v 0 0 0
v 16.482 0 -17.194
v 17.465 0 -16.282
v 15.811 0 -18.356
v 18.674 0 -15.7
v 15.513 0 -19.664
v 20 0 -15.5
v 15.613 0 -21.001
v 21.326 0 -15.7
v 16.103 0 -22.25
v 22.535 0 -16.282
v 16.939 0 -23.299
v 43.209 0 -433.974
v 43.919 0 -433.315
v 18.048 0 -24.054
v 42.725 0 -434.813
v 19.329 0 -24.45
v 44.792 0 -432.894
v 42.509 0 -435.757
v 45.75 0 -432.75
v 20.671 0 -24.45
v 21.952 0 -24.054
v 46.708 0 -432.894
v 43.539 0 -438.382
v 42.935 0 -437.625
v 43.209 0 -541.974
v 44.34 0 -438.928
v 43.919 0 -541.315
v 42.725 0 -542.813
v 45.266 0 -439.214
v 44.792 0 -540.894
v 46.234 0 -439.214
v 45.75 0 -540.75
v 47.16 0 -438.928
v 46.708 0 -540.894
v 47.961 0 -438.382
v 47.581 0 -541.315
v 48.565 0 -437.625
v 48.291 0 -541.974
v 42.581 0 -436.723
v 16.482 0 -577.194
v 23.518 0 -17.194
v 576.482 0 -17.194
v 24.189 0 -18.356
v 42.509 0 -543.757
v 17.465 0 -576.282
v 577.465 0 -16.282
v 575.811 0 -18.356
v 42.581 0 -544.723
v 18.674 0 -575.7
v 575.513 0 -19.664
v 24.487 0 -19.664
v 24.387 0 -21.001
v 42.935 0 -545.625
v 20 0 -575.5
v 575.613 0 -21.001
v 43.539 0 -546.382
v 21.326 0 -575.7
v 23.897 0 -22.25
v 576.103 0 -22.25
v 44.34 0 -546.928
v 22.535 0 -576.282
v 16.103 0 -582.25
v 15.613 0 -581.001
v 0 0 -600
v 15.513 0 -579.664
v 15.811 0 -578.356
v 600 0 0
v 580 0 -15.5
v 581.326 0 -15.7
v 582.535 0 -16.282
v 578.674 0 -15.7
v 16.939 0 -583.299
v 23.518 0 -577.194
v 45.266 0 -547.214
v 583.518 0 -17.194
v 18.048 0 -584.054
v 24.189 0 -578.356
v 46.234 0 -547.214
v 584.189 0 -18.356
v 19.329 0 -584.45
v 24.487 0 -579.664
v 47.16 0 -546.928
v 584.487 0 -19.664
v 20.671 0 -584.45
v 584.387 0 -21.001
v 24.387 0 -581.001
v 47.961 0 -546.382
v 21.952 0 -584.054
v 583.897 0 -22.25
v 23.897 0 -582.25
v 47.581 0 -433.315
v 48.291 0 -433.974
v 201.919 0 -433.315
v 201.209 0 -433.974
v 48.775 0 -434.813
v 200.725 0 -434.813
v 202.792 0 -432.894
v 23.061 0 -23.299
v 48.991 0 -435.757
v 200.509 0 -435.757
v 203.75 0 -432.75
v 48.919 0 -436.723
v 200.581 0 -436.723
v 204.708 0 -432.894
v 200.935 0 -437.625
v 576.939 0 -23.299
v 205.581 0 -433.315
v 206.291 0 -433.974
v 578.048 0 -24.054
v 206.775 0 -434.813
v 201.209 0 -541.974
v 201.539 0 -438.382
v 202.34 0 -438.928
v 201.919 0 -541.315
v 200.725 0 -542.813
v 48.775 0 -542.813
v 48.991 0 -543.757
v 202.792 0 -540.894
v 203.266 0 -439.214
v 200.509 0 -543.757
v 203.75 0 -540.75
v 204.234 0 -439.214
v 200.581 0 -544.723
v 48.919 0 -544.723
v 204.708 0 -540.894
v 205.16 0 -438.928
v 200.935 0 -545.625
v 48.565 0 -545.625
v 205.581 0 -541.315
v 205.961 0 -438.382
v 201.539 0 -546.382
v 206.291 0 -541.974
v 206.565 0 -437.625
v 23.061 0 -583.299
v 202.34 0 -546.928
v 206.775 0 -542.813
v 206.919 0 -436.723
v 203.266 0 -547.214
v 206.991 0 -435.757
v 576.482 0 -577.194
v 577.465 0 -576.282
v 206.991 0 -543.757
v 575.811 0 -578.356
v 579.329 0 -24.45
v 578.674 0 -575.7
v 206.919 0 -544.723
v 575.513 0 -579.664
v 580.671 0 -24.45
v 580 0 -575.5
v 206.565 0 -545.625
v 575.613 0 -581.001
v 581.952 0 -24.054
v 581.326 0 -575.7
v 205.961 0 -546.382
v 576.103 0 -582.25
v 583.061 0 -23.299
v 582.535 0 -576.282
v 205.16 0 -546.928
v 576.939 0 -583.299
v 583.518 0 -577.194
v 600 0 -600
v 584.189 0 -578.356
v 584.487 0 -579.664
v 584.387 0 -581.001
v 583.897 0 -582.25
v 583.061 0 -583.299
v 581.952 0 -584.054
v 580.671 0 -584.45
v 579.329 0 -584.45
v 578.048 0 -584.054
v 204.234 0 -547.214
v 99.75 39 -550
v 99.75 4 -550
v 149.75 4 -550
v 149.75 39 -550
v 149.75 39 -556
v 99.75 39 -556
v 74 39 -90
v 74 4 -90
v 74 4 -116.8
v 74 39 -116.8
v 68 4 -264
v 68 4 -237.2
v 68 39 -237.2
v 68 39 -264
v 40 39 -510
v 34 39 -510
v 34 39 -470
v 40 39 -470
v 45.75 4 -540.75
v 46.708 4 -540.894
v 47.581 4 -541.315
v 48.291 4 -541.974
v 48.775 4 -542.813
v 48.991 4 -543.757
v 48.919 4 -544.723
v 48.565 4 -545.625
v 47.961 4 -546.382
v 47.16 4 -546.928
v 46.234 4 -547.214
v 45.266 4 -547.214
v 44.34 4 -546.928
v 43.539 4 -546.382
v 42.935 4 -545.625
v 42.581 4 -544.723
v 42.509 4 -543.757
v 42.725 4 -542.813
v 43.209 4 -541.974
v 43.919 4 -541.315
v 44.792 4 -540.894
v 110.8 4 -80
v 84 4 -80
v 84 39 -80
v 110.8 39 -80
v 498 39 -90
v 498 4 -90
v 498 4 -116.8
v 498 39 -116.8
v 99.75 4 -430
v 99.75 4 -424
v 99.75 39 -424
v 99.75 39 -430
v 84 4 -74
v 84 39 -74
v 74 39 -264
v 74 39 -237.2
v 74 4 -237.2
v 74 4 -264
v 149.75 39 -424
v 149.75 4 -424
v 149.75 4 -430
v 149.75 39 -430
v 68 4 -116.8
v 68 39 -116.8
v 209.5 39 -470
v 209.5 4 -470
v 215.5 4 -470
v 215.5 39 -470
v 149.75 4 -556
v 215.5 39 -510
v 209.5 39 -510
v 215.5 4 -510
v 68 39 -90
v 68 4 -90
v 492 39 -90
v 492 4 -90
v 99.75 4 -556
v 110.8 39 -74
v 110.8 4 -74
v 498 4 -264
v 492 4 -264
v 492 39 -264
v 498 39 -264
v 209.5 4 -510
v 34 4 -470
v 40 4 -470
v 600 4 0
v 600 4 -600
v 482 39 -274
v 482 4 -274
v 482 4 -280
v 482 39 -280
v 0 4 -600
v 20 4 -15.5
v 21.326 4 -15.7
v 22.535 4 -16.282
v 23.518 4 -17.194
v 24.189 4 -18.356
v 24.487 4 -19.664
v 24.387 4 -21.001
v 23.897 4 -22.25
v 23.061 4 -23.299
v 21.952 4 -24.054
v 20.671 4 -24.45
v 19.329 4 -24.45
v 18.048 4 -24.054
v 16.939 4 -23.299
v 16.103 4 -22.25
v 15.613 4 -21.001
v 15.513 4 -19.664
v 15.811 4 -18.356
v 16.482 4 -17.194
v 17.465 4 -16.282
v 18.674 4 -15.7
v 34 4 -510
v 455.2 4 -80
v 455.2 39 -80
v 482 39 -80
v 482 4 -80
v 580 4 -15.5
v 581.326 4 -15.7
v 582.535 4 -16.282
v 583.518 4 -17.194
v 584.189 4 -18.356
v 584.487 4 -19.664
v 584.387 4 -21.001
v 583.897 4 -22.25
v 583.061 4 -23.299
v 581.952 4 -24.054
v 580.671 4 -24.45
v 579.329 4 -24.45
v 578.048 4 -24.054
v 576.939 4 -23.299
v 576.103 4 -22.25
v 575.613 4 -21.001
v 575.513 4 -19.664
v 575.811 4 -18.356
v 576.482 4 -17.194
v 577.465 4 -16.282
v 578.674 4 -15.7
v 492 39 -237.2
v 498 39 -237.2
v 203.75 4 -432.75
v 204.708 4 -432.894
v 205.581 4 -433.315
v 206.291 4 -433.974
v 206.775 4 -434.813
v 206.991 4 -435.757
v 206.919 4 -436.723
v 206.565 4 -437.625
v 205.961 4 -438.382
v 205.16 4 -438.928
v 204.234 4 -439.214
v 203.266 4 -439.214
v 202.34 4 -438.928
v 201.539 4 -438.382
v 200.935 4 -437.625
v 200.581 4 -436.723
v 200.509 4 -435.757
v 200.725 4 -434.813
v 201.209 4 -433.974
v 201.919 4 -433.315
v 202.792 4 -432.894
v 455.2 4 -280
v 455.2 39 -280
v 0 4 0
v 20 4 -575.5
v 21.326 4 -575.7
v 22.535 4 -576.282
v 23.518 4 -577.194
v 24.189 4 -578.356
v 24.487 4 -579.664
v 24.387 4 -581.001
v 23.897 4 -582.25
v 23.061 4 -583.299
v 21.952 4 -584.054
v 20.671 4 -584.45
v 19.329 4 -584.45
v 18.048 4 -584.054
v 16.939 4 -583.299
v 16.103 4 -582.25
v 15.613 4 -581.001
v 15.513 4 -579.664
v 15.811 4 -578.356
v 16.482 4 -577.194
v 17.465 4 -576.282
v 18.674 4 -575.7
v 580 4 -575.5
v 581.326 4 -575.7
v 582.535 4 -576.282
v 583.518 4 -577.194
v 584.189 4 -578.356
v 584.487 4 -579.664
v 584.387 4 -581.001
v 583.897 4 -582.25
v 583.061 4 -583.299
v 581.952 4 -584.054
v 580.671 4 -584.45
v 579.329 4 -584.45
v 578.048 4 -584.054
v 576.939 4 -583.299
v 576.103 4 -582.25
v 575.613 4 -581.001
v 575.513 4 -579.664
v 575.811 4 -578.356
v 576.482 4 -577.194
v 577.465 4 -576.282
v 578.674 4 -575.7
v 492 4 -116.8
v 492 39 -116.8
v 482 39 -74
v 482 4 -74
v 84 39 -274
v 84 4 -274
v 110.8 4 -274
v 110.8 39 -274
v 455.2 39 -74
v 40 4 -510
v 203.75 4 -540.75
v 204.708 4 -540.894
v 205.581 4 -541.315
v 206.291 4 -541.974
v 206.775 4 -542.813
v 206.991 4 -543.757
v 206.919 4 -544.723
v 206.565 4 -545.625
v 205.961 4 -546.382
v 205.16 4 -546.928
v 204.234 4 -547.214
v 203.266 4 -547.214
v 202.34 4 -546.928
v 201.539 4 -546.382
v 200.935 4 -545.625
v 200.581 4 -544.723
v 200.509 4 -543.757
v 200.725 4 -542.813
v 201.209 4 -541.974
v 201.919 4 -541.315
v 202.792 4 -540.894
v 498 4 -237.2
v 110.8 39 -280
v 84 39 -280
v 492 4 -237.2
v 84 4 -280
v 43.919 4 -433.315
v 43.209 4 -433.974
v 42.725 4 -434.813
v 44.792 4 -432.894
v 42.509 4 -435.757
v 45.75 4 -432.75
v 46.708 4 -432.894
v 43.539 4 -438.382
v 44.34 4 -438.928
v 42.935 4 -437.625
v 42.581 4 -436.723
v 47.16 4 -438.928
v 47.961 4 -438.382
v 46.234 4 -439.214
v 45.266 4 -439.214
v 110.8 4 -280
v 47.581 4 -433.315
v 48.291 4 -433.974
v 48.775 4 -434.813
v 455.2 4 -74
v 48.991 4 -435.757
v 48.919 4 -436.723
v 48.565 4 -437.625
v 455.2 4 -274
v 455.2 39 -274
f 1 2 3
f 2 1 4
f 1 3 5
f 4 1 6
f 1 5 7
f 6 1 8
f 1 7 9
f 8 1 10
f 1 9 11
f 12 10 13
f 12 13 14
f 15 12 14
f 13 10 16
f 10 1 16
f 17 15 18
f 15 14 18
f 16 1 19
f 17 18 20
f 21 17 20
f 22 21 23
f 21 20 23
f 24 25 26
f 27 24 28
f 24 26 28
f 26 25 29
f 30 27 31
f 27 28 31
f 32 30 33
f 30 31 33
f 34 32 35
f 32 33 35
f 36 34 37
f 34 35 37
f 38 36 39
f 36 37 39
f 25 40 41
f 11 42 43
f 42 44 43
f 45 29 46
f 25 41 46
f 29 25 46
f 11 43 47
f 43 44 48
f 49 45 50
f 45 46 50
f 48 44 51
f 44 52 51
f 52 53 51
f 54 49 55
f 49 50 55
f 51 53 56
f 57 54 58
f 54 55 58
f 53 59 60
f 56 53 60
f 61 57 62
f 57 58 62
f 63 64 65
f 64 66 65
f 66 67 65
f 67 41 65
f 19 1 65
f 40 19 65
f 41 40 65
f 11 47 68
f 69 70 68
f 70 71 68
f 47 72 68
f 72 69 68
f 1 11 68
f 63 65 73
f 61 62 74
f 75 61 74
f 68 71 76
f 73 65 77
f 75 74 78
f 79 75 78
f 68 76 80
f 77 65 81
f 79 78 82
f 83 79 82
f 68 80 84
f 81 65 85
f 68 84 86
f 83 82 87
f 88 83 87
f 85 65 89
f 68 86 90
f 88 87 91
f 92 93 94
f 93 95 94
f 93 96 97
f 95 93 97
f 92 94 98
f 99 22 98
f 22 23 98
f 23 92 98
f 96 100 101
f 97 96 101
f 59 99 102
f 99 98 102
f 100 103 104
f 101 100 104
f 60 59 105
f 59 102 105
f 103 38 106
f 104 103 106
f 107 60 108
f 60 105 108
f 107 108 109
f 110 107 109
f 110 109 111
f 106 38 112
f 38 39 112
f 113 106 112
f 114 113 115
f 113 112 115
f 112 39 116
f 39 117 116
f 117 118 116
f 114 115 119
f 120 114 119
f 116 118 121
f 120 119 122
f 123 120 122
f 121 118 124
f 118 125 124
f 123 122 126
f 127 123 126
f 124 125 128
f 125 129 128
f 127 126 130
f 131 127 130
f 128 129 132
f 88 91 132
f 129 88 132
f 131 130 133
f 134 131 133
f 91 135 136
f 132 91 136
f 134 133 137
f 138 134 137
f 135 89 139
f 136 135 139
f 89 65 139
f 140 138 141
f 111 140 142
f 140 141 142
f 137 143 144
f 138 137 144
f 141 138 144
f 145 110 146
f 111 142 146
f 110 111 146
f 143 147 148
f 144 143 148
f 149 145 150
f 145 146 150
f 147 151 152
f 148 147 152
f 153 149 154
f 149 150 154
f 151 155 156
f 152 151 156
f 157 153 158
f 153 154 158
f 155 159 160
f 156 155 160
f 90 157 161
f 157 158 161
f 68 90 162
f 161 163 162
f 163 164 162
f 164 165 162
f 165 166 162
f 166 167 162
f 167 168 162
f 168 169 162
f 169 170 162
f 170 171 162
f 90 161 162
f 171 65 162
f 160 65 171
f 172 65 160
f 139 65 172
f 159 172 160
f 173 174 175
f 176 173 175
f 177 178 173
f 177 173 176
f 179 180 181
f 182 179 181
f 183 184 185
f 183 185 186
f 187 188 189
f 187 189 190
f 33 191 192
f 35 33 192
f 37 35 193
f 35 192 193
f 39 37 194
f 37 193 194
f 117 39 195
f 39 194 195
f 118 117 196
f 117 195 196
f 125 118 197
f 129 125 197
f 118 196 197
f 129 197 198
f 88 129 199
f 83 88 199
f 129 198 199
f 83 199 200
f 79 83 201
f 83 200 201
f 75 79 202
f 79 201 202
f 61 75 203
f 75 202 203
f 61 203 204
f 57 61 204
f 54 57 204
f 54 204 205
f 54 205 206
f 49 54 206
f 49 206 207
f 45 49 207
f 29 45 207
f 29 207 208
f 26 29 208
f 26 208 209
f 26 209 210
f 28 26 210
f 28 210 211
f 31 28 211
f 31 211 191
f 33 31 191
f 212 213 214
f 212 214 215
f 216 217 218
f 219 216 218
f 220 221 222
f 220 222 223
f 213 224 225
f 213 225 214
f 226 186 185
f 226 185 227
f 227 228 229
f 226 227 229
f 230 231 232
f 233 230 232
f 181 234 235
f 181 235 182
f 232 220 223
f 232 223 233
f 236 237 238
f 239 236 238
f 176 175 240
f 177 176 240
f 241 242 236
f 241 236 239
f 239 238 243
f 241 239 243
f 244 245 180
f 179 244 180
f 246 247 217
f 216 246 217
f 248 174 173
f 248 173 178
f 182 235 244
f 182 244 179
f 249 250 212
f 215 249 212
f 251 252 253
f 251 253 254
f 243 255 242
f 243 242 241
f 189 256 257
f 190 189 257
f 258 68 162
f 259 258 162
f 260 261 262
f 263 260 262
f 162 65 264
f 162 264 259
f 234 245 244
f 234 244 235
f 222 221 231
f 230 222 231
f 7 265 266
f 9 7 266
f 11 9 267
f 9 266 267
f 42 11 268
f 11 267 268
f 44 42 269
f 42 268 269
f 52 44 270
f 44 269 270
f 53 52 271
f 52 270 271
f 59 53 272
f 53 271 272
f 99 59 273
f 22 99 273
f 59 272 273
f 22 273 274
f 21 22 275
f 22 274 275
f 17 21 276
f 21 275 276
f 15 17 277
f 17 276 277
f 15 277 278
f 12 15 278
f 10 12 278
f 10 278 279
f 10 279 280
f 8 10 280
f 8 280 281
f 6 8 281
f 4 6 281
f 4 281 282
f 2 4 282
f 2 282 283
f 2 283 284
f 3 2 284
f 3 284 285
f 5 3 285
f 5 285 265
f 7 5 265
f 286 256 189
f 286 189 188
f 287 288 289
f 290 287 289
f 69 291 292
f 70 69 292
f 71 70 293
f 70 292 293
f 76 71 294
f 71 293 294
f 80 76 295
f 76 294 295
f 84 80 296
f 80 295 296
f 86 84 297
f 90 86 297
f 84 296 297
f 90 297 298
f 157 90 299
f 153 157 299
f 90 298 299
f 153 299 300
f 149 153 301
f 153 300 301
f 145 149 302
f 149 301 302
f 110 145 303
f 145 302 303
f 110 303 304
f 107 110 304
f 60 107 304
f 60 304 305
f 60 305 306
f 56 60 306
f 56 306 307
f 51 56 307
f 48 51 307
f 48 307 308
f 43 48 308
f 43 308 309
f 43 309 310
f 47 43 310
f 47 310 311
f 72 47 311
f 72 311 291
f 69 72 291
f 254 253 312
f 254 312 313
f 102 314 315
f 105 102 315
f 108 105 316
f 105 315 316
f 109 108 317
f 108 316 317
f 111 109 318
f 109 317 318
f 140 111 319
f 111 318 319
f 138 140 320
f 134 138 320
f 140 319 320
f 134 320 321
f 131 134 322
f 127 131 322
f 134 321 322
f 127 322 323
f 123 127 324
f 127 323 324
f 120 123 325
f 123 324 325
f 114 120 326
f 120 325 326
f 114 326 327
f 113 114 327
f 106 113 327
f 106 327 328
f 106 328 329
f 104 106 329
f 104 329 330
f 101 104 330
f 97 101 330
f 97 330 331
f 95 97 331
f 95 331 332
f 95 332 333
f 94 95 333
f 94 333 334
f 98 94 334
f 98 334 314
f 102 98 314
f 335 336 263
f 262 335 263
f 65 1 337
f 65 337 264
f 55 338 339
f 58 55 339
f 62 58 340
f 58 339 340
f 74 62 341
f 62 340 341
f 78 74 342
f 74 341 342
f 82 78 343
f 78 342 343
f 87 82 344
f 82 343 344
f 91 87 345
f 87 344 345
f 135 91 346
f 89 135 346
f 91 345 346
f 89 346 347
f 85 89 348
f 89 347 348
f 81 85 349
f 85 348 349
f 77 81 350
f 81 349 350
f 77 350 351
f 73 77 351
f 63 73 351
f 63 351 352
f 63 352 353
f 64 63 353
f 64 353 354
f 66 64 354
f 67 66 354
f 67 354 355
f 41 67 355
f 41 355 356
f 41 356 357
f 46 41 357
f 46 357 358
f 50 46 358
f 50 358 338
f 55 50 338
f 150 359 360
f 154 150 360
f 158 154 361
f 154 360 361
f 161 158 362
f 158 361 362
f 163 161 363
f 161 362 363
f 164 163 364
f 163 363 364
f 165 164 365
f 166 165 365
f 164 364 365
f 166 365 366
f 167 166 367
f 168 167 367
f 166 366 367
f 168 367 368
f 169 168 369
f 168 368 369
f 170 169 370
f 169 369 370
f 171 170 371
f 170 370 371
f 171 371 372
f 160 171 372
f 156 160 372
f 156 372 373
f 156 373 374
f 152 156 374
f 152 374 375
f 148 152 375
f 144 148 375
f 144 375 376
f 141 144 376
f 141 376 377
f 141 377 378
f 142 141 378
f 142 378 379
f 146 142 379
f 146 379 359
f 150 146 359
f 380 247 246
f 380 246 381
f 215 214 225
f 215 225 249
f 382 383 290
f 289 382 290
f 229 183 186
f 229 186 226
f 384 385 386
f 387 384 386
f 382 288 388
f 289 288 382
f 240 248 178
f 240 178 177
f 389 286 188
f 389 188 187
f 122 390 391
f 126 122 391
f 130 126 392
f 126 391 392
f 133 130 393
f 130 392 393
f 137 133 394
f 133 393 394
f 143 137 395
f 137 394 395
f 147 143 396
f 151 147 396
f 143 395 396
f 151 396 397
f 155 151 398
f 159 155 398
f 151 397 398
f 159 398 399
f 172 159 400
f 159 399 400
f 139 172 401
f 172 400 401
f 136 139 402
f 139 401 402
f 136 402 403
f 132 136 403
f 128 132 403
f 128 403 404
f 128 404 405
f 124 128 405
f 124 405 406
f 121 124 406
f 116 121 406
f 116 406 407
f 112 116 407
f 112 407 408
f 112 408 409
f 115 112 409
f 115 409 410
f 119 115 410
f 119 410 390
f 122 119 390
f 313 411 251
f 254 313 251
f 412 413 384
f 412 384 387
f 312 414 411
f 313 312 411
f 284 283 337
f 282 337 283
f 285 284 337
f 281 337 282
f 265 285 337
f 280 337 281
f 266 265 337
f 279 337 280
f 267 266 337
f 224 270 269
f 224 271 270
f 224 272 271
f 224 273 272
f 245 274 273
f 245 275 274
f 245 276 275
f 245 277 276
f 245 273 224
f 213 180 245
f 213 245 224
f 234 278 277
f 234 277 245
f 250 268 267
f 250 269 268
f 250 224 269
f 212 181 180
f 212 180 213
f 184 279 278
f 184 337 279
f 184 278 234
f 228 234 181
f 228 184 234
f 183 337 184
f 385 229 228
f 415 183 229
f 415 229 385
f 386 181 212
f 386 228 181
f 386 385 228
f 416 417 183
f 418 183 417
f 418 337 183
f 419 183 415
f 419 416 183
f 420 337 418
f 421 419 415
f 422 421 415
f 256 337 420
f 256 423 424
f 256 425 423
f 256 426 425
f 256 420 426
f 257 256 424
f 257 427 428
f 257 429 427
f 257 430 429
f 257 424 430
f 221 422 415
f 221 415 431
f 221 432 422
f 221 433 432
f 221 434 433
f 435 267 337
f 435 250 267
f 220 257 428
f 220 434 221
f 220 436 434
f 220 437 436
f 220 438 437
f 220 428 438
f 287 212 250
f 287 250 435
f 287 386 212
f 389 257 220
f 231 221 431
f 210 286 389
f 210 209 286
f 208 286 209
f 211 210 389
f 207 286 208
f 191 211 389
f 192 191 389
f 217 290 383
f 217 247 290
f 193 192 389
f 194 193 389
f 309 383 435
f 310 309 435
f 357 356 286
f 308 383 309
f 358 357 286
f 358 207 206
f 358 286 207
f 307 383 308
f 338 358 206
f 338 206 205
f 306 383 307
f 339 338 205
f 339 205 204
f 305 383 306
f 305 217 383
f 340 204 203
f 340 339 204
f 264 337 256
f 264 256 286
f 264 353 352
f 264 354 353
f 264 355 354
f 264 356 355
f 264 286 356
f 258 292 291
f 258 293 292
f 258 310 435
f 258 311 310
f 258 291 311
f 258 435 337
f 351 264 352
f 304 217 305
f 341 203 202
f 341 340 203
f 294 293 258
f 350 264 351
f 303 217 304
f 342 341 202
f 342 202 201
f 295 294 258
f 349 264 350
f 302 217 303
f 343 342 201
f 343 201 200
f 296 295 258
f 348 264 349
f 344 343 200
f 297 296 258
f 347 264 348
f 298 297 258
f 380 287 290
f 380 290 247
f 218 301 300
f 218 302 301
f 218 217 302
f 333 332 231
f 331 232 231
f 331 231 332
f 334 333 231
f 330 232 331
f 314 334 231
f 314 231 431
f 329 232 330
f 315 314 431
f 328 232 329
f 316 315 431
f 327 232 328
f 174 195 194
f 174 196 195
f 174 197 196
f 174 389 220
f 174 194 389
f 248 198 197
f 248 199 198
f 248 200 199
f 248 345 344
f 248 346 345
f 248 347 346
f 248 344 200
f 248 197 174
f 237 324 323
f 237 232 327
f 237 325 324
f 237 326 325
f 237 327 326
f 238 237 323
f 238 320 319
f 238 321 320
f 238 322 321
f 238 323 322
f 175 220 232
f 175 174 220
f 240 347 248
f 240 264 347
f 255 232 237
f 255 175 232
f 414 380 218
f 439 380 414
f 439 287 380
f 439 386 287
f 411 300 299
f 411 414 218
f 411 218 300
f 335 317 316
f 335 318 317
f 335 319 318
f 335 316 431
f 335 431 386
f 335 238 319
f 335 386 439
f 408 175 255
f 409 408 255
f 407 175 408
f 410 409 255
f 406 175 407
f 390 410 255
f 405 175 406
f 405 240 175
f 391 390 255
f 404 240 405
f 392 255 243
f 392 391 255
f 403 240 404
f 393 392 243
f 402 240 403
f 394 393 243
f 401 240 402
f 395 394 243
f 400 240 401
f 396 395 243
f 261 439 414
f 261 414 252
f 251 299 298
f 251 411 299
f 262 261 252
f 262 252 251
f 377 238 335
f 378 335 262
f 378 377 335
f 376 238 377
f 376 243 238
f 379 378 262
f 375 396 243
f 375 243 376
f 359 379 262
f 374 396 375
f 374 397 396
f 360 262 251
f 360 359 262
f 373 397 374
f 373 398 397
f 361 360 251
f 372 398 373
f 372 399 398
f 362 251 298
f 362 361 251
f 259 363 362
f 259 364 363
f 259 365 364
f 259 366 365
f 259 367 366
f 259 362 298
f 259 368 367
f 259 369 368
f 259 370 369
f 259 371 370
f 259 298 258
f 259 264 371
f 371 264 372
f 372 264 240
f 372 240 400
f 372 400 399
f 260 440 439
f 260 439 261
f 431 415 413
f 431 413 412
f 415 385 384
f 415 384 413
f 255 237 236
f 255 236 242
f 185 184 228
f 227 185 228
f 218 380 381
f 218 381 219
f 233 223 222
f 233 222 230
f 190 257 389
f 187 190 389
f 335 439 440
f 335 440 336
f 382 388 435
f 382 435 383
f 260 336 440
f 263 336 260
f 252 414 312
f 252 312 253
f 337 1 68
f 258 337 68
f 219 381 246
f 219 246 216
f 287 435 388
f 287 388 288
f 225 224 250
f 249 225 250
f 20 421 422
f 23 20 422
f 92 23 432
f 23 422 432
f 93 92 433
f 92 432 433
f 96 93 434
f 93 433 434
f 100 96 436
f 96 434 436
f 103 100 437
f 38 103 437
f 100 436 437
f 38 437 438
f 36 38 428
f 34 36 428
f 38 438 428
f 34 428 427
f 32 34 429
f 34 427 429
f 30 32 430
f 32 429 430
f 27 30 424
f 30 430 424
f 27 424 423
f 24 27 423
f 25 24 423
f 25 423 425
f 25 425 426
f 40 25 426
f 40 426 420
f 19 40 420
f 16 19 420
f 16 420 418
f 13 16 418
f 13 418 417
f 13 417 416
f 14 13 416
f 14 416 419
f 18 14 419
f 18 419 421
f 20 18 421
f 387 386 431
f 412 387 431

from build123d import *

# Parameters (mm, degrees)
SKETCH1_W           = 600
SKETCH1_H           = 600
BOSS_EXTRUDE1_DEPTH = 4
CUT_EXTRUDE1_REACH  = 850.538
SKETCH2_R           = 4.5
CUT_EXTRUDE2_REACH  = 850.538
SKETCH4_R           = 3.25
SKETCH4_3_W         = 6
SKETCH4_3_H         = 40
SKETCH4_3_W_2       = 50
SKETCH4_3_H_2       = 6
BOSS_EXTRUDE2_DEPTH = 35
SKETCH5_W           = 6
SKETCH5_H           = 26.8
SKETCH5_W_2         = 26.8
SKETCH5_H_2         = 6
BOSS_EXTRUDE3_DEPTH = 35


with BuildPart() as part:
    # Sketch1 → Boss-Extrude1 (new body)
    with BuildSketch(Plane(origin=(0, 0, 0), x_dir=(1, 0, 0), z_dir=(0, 1, 0))):
        with Locations((300, 300)):
            Rectangle(SKETCH1_W, SKETCH1_H)
    extrude(amount=BOSS_EXTRUDE1_DEPTH)

    # Sketch2 → Cut-Extrude1 (cut, up to next)
    with BuildSketch(Plane(origin=(0, 4, 0), x_dir=(1, 0, 0), z_dir=(0, 1, 0)), mode=Mode.PRIVATE) as cut_extrude1_sk1:
        with Locations((20, 580)):
            Circle(SKETCH2_R)
    cut_extrude1_tool1 = extrude(cut_extrude1_sk1.sketch, amount=-CUT_EXTRUDE1_REACH, mode=Mode.PRIVATE) & part.part
    # Sketch2 → Cut-Extrude1 (cut, up to next)
    with BuildSketch(Plane(origin=(0, 4, 0), x_dir=(1, 0, 0), z_dir=(0, 1, 0)), mode=Mode.PRIVATE) as cut_extrude1_sk2:
        with Locations((580, 580)):
            Circle(SKETCH2_R)
    cut_extrude1_tool2 = extrude(cut_extrude1_sk2.sketch, amount=-CUT_EXTRUDE1_REACH, mode=Mode.PRIVATE) & part.part
    # Sketch2 → Cut-Extrude1 (cut, up to next)
    with BuildSketch(Plane(origin=(0, 4, 0), x_dir=(1, 0, 0), z_dir=(0, 1, 0)), mode=Mode.PRIVATE) as cut_extrude1_sk3:
        with Locations((580, 20)):
            Circle(SKETCH2_R)
    cut_extrude1_tool3 = extrude(cut_extrude1_sk3.sketch, amount=-CUT_EXTRUDE1_REACH, mode=Mode.PRIVATE) & part.part
    # Sketch2 → Cut-Extrude1 (cut, up to next)
    with BuildSketch(Plane(origin=(0, 4, 0), x_dir=(1, 0, 0), z_dir=(0, 1, 0)), mode=Mode.PRIVATE) as cut_extrude1_sk4:
        with Locations((20, 20)):
            Circle(SKETCH2_R)
    cut_extrude1_tool4 = extrude(cut_extrude1_sk4.sketch, amount=-CUT_EXTRUDE1_REACH, mode=Mode.PRIVATE) & part.part
    add(cut_extrude1_tool1.solids().sort_by_distance((20, 4, -580))[0], mode=Mode.SUBTRACT)
    add(cut_extrude1_tool2.solids().sort_by_distance((580, 4, -580))[0], mode=Mode.SUBTRACT)
    add(cut_extrude1_tool3.solids().sort_by_distance((580, 4, -20))[0], mode=Mode.SUBTRACT)
    add(cut_extrude1_tool4.solids().sort_by_distance((20, 4, -20))[0], mode=Mode.SUBTRACT)

    # Sketch4 → Cut-Extrude2 (cut, up to next)
    with BuildSketch(Plane(origin=(0, 4, 0), x_dir=(1, 0, 0), z_dir=(0, 1, 0)), mode=Mode.PRIVATE) as cut_extrude2_sk1:
        with Locations((45.75, 544)):
            Circle(SKETCH4_R)
    cut_extrude2_tool1 = extrude(cut_extrude2_sk1.sketch, amount=-CUT_EXTRUDE2_REACH, mode=Mode.PRIVATE) & part.part
    # Sketch4 → Cut-Extrude2 (cut, up to next)
    with BuildSketch(Plane(origin=(0, 4, 0), x_dir=(1, 0, 0), z_dir=(0, 1, 0)), mode=Mode.PRIVATE) as cut_extrude2_sk2:
        with Locations((203.75, 544)):
            Circle(SKETCH4_R)
    cut_extrude2_tool2 = extrude(cut_extrude2_sk2.sketch, amount=-CUT_EXTRUDE2_REACH, mode=Mode.PRIVATE) & part.part
    # Sketch4 → Cut-Extrude2 (cut, up to next)
    with BuildSketch(Plane(origin=(0, 4, 0), x_dir=(1, 0, 0), z_dir=(0, 1, 0)), mode=Mode.PRIVATE) as cut_extrude2_sk3:
        with Locations((45.75, 436)):
            Circle(SKETCH4_R)
    cut_extrude2_tool3 = extrude(cut_extrude2_sk3.sketch, amount=-CUT_EXTRUDE2_REACH, mode=Mode.PRIVATE) & part.part
    # Sketch4 → Cut-Extrude2 (cut, up to next)
    with BuildSketch(Plane(origin=(0, 4, 0), x_dir=(1, 0, 0), z_dir=(0, 1, 0)), mode=Mode.PRIVATE) as cut_extrude2_sk4:
        with Locations((203.75, 436)):
            Circle(SKETCH4_R)
    cut_extrude2_tool4 = extrude(cut_extrude2_sk4.sketch, amount=-CUT_EXTRUDE2_REACH, mode=Mode.PRIVATE) & part.part
    add(cut_extrude2_tool1.solids().sort_by_distance((45.75, 4, -544))[0], mode=Mode.SUBTRACT)
    add(cut_extrude2_tool2.solids().sort_by_distance((203.75, 4, -544))[0], mode=Mode.SUBTRACT)
    add(cut_extrude2_tool3.solids().sort_by_distance((45.75, 4, -436))[0], mode=Mode.SUBTRACT)
    add(cut_extrude2_tool4.solids().sort_by_distance((203.75, 4, -436))[0], mode=Mode.SUBTRACT)

    # Sketch4<3> → Boss-Extrude2 (add)
    with BuildSketch(Plane(origin=(0, 4, 0), x_dir=(1, 0, 0), z_dir=(0, 1, 0))):
        with Locations((37, 490)):
            Rectangle(SKETCH4_3_W, SKETCH4_3_H)
        with Locations((124.75, 553)):
            Rectangle(SKETCH4_3_W_2, SKETCH4_3_H_2)
        with Locations((212.5, 490)):
            Rectangle(SKETCH4_3_W, SKETCH4_3_H)
        with Locations((124.75, 427)):
            Rectangle(SKETCH4_3_W_2, SKETCH4_3_H_2)
    extrude(amount=BOSS_EXTRUDE2_DEPTH)

    # Sketch5 → Boss-Extrude3 (add)
    with BuildSketch(Plane(origin=(0, 4, 0), x_dir=(1, 0, 0), z_dir=(0, 1, 0))):
        with Locations((495, 103.4)):
            Rectangle(SKETCH5_W, SKETCH5_H)
        with Locations((97.4, 277)):
            Rectangle(SKETCH5_W_2, SKETCH5_H_2)
        with Locations((71, 250.6)):
            Rectangle(SKETCH5_W, SKETCH5_H)
        with Locations((97.4, 77)):
            Rectangle(SKETCH5_W_2, SKETCH5_H_2)
        with Locations((495, 250.6)):
            Rectangle(SKETCH5_W, SKETCH5_H)
        with Locations((468.6, 277)):
            Rectangle(SKETCH5_W_2, SKETCH5_H_2)
        with Locations((71, 103.4)):
            Rectangle(SKETCH5_W, SKETCH5_H)
        with Locations((468.6, 77)):
            Rectangle(SKETCH5_W_2, SKETCH5_H_2)
    extrude(amount=BOSS_EXTRUDE3_DEPTH)


solid = part.part
